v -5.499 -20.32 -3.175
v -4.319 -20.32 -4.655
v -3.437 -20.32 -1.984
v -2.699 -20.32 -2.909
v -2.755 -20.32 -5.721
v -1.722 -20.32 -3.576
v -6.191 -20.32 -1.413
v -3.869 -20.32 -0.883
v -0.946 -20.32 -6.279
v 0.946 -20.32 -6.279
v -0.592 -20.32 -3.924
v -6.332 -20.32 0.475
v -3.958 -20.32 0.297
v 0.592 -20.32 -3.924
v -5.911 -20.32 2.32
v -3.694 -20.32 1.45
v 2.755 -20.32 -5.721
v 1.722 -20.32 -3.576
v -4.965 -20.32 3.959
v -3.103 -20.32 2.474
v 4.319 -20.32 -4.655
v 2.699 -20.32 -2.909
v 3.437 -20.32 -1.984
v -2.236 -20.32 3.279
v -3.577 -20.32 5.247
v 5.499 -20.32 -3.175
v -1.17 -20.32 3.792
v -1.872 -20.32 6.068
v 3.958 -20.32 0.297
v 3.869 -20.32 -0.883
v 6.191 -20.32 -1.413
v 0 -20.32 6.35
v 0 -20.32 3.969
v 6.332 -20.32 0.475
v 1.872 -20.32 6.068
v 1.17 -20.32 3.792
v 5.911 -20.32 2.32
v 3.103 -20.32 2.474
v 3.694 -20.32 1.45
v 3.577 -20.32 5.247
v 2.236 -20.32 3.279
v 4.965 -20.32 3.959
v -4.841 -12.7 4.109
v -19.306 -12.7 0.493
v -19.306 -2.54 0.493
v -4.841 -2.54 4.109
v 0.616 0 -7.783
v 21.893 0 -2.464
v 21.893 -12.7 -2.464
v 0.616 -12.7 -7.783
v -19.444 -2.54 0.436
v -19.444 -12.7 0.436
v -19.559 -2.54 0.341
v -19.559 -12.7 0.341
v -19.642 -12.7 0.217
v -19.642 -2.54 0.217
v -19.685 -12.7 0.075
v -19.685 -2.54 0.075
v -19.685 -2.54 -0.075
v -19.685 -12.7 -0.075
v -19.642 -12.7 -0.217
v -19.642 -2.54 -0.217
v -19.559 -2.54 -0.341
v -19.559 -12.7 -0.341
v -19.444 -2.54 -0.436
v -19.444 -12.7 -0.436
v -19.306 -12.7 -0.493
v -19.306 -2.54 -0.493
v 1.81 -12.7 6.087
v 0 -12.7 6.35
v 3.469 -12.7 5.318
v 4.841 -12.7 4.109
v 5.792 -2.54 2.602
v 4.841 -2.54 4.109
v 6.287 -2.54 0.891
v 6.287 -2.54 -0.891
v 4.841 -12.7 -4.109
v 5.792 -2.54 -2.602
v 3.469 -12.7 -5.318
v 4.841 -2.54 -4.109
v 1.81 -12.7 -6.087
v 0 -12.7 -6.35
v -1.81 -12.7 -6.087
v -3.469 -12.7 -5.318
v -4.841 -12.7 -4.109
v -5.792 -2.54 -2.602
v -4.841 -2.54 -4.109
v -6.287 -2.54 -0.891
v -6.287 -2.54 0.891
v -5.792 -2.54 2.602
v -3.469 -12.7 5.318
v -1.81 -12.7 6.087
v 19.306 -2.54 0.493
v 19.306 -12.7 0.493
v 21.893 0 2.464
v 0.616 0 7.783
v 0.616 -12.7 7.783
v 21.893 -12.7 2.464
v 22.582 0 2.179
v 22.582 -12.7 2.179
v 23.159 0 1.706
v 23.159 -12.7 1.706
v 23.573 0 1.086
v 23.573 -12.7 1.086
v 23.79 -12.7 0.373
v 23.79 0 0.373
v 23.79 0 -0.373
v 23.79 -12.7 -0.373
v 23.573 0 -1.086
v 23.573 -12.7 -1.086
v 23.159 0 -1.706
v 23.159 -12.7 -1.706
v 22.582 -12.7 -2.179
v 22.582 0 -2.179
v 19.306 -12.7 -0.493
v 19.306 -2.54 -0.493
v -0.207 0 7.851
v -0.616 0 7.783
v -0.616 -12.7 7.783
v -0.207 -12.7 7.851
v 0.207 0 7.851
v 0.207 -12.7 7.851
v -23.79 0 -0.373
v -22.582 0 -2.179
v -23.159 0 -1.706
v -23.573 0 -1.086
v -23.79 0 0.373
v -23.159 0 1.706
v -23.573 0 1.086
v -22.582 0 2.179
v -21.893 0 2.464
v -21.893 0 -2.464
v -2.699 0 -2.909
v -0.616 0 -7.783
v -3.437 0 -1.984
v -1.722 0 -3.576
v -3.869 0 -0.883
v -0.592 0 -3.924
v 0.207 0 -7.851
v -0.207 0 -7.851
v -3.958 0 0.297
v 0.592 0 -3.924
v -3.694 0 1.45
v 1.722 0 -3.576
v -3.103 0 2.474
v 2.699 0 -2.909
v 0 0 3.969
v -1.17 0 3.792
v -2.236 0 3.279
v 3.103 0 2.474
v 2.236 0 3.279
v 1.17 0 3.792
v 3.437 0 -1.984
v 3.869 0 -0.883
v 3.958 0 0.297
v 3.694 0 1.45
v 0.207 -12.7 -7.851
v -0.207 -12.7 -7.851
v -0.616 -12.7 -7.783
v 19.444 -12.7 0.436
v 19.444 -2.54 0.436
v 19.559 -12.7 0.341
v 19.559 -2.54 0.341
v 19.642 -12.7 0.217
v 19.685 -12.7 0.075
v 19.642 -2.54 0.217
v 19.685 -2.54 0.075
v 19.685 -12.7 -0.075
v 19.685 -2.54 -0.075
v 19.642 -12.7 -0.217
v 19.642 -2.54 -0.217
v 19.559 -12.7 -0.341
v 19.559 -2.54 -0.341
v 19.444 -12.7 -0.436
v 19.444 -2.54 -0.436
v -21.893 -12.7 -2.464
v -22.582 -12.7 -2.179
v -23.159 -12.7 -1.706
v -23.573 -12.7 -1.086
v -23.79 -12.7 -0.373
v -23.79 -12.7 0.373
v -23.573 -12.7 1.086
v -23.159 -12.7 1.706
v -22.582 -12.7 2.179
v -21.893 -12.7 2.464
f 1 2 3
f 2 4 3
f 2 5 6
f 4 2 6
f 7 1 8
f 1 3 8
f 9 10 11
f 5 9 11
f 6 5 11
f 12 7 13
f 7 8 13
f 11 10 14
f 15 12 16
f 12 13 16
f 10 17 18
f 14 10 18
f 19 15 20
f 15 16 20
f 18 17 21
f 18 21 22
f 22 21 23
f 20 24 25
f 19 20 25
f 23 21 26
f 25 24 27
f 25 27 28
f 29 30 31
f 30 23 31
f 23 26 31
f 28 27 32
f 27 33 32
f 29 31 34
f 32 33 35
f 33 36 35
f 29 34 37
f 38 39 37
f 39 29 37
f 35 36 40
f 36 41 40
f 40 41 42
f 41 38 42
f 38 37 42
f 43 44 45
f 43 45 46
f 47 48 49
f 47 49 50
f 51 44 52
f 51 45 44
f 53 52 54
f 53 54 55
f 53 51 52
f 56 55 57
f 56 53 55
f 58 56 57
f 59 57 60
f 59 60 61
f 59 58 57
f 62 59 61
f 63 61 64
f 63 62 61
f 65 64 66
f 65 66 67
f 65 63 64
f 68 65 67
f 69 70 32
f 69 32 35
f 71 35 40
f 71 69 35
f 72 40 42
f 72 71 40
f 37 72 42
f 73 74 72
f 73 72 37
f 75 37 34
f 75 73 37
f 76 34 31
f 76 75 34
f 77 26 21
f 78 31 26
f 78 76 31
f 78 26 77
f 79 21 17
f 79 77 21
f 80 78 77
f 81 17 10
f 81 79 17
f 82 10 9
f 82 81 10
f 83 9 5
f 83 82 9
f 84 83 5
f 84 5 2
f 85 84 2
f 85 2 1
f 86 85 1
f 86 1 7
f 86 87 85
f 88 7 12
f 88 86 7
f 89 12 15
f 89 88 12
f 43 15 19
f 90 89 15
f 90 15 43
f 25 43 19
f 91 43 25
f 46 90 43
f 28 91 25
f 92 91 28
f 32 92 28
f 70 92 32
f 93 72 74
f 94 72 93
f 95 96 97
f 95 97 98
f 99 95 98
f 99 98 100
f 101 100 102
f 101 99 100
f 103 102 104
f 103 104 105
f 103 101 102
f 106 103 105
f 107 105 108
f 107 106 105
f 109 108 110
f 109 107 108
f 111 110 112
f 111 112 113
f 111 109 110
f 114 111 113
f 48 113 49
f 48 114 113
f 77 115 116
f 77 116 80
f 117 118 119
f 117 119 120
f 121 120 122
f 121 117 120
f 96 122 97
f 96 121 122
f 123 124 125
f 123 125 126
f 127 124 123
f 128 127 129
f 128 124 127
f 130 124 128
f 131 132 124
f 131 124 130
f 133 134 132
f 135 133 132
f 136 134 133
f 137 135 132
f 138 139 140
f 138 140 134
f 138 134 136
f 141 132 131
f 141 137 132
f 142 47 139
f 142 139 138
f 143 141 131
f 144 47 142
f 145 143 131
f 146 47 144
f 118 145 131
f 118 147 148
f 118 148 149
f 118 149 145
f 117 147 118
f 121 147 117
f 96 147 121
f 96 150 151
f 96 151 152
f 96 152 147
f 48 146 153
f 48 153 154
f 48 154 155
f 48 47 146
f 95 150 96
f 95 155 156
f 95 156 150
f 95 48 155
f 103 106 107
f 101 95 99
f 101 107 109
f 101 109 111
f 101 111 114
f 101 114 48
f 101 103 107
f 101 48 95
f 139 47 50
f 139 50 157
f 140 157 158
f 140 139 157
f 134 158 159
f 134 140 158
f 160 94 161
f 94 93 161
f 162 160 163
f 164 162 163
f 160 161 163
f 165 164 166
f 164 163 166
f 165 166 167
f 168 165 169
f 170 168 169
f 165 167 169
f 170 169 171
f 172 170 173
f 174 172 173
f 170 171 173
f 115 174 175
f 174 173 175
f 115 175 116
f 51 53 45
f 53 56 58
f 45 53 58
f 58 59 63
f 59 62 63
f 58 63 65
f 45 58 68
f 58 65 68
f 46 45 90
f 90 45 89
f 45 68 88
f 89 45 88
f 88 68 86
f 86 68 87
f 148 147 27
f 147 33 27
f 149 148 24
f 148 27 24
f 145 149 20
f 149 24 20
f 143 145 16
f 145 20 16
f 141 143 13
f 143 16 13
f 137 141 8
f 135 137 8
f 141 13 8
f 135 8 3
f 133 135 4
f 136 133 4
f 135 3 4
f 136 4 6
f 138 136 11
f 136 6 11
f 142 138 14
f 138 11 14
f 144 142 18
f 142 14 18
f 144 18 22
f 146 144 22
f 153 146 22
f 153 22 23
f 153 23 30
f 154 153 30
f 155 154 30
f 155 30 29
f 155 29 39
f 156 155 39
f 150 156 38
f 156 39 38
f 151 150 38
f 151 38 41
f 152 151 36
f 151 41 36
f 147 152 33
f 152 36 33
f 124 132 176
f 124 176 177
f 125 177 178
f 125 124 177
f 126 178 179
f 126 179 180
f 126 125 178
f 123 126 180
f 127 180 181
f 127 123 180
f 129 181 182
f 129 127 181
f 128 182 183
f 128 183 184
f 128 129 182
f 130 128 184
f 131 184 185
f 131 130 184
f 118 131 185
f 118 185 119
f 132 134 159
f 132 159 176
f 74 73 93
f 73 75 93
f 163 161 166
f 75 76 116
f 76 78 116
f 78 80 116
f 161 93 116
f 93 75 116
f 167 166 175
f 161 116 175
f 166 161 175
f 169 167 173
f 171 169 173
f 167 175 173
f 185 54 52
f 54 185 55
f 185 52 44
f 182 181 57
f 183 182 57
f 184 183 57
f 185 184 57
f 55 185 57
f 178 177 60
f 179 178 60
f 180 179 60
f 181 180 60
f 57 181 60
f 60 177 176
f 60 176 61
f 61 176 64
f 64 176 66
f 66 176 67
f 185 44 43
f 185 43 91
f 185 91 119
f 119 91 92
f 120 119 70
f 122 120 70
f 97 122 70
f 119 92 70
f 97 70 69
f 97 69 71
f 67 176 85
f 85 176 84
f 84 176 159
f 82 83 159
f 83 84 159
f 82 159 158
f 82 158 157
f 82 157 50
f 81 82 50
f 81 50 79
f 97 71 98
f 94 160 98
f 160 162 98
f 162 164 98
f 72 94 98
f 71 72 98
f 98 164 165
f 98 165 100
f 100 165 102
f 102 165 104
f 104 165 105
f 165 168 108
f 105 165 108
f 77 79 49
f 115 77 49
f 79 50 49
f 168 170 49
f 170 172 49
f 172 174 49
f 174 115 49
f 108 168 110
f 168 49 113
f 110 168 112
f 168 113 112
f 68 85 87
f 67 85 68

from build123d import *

# Parameters (mm, degrees)
BOSS_EXTRUDE1_DEPTH = 12.7
SHELL1_START        = -12.7
SHELL1_DEPTH        = 10.16
FILLET1_R           = 0.508
SKETCH2_R           = 6.35
SKETCH2_R_2         = 3.96875
BOSS_EXTRUDE2_DEPTH = 20.32
SKETCH3_R           = 3.96875
CUT_EXTRUDE1_DEPTH  = 31.743483417


# Read off the part's stored shape, not the designer's step: Shell1
with BuildPart() as part:
    # Sketch1 → Boss-Extrude1 (new body)
    with BuildSketch(Plane(origin=(0, 0, 0), x_dir=(1, 0, 0), z_dir=(0, 1, 0))):
        with BuildLine():
            Line((-21.893352199, -2.46416195), (-0.616040488, -7.783489878))
            ThreePointArc((-0.616040488, -7.783489878), (0, -7.859327928), (0.616040488, -7.783489878))
            Line((0.616040488, -7.783489878), (21.893352199, -2.46416195))
            ThreePointArc((21.893352199, -2.46416195), (23.817311711, 0), (21.893352199, 2.46416195))
            Line((21.893352199, 2.46416195), (0.616040488, 7.783489878))
            ThreePointArc((0.616040488, 7.783489878), (0, 7.859327928), (-0.616040488, 7.783489878))
            Line((-0.616040488, 7.783489878), (-21.893352199, 2.46416195))
            ThreePointArc((-21.893352199, 2.46416195), (-23.817311711, 0), (-21.893352199, -2.46416195))
        make_face()
    extrude(amount=-BOSS_EXTRUDE1_DEPTH)

    # Shell1 outline → Shell1 (cut)
    with BuildSketch(Plane(origin=(0, 0, 0), x_dir=(1, 0, 0), z_dir=(0, 1, 0)).offset(SHELL1_START)):
        Polygon((-21.277311711, 0), (0, -5.319327928), (21.277311711, 0), (0, 5.319327928), align=None)
    extrude(amount=SHELL1_DEPTH, mode=Mode.SUBTRACT)

    # Fillet1
    fillet1_edges = [part.edges().sort_by_distance(p)[0] for p in [
        (21.277311711, -7.62, 0),
        (0, -7.62, 5.319327928),
        (-21.277311711, -7.62, 0),
        (0, -7.62, -5.319327928),
    ]]
    fillet(fillet1_edges, radius=FILLET1_R)

    # Sketch2 → Boss-Extrude2 (add)
    with BuildSketch(Plane(origin=(0, 0, 0), x_dir=(1, 0, 0), z_dir=(0, 1, 0))):
        with Locations(Location((0, 0, 0), (0, 0, 270))):
            Circle(SKETCH2_R)
        with Locations(Location((0, 0, 0), (0, 0, 270))):
            Circle(SKETCH2_R_2, mode=Mode.SUBTRACT)
    extrude(amount=-BOSS_EXTRUDE2_DEPTH)

    # Sketch3 → Cut-Extrude1 (cut, through all)
    with BuildSketch(Plane.XZ.offset(2.54)):
        with Locations(Location((0, 0, 0), (0, 0, 90))):
            Circle(SKETCH3_R)
    extrude(amount=-CUT_EXTRUDE1_DEPTH, mode=Mode.SUBTRACT)


solid = part.part
